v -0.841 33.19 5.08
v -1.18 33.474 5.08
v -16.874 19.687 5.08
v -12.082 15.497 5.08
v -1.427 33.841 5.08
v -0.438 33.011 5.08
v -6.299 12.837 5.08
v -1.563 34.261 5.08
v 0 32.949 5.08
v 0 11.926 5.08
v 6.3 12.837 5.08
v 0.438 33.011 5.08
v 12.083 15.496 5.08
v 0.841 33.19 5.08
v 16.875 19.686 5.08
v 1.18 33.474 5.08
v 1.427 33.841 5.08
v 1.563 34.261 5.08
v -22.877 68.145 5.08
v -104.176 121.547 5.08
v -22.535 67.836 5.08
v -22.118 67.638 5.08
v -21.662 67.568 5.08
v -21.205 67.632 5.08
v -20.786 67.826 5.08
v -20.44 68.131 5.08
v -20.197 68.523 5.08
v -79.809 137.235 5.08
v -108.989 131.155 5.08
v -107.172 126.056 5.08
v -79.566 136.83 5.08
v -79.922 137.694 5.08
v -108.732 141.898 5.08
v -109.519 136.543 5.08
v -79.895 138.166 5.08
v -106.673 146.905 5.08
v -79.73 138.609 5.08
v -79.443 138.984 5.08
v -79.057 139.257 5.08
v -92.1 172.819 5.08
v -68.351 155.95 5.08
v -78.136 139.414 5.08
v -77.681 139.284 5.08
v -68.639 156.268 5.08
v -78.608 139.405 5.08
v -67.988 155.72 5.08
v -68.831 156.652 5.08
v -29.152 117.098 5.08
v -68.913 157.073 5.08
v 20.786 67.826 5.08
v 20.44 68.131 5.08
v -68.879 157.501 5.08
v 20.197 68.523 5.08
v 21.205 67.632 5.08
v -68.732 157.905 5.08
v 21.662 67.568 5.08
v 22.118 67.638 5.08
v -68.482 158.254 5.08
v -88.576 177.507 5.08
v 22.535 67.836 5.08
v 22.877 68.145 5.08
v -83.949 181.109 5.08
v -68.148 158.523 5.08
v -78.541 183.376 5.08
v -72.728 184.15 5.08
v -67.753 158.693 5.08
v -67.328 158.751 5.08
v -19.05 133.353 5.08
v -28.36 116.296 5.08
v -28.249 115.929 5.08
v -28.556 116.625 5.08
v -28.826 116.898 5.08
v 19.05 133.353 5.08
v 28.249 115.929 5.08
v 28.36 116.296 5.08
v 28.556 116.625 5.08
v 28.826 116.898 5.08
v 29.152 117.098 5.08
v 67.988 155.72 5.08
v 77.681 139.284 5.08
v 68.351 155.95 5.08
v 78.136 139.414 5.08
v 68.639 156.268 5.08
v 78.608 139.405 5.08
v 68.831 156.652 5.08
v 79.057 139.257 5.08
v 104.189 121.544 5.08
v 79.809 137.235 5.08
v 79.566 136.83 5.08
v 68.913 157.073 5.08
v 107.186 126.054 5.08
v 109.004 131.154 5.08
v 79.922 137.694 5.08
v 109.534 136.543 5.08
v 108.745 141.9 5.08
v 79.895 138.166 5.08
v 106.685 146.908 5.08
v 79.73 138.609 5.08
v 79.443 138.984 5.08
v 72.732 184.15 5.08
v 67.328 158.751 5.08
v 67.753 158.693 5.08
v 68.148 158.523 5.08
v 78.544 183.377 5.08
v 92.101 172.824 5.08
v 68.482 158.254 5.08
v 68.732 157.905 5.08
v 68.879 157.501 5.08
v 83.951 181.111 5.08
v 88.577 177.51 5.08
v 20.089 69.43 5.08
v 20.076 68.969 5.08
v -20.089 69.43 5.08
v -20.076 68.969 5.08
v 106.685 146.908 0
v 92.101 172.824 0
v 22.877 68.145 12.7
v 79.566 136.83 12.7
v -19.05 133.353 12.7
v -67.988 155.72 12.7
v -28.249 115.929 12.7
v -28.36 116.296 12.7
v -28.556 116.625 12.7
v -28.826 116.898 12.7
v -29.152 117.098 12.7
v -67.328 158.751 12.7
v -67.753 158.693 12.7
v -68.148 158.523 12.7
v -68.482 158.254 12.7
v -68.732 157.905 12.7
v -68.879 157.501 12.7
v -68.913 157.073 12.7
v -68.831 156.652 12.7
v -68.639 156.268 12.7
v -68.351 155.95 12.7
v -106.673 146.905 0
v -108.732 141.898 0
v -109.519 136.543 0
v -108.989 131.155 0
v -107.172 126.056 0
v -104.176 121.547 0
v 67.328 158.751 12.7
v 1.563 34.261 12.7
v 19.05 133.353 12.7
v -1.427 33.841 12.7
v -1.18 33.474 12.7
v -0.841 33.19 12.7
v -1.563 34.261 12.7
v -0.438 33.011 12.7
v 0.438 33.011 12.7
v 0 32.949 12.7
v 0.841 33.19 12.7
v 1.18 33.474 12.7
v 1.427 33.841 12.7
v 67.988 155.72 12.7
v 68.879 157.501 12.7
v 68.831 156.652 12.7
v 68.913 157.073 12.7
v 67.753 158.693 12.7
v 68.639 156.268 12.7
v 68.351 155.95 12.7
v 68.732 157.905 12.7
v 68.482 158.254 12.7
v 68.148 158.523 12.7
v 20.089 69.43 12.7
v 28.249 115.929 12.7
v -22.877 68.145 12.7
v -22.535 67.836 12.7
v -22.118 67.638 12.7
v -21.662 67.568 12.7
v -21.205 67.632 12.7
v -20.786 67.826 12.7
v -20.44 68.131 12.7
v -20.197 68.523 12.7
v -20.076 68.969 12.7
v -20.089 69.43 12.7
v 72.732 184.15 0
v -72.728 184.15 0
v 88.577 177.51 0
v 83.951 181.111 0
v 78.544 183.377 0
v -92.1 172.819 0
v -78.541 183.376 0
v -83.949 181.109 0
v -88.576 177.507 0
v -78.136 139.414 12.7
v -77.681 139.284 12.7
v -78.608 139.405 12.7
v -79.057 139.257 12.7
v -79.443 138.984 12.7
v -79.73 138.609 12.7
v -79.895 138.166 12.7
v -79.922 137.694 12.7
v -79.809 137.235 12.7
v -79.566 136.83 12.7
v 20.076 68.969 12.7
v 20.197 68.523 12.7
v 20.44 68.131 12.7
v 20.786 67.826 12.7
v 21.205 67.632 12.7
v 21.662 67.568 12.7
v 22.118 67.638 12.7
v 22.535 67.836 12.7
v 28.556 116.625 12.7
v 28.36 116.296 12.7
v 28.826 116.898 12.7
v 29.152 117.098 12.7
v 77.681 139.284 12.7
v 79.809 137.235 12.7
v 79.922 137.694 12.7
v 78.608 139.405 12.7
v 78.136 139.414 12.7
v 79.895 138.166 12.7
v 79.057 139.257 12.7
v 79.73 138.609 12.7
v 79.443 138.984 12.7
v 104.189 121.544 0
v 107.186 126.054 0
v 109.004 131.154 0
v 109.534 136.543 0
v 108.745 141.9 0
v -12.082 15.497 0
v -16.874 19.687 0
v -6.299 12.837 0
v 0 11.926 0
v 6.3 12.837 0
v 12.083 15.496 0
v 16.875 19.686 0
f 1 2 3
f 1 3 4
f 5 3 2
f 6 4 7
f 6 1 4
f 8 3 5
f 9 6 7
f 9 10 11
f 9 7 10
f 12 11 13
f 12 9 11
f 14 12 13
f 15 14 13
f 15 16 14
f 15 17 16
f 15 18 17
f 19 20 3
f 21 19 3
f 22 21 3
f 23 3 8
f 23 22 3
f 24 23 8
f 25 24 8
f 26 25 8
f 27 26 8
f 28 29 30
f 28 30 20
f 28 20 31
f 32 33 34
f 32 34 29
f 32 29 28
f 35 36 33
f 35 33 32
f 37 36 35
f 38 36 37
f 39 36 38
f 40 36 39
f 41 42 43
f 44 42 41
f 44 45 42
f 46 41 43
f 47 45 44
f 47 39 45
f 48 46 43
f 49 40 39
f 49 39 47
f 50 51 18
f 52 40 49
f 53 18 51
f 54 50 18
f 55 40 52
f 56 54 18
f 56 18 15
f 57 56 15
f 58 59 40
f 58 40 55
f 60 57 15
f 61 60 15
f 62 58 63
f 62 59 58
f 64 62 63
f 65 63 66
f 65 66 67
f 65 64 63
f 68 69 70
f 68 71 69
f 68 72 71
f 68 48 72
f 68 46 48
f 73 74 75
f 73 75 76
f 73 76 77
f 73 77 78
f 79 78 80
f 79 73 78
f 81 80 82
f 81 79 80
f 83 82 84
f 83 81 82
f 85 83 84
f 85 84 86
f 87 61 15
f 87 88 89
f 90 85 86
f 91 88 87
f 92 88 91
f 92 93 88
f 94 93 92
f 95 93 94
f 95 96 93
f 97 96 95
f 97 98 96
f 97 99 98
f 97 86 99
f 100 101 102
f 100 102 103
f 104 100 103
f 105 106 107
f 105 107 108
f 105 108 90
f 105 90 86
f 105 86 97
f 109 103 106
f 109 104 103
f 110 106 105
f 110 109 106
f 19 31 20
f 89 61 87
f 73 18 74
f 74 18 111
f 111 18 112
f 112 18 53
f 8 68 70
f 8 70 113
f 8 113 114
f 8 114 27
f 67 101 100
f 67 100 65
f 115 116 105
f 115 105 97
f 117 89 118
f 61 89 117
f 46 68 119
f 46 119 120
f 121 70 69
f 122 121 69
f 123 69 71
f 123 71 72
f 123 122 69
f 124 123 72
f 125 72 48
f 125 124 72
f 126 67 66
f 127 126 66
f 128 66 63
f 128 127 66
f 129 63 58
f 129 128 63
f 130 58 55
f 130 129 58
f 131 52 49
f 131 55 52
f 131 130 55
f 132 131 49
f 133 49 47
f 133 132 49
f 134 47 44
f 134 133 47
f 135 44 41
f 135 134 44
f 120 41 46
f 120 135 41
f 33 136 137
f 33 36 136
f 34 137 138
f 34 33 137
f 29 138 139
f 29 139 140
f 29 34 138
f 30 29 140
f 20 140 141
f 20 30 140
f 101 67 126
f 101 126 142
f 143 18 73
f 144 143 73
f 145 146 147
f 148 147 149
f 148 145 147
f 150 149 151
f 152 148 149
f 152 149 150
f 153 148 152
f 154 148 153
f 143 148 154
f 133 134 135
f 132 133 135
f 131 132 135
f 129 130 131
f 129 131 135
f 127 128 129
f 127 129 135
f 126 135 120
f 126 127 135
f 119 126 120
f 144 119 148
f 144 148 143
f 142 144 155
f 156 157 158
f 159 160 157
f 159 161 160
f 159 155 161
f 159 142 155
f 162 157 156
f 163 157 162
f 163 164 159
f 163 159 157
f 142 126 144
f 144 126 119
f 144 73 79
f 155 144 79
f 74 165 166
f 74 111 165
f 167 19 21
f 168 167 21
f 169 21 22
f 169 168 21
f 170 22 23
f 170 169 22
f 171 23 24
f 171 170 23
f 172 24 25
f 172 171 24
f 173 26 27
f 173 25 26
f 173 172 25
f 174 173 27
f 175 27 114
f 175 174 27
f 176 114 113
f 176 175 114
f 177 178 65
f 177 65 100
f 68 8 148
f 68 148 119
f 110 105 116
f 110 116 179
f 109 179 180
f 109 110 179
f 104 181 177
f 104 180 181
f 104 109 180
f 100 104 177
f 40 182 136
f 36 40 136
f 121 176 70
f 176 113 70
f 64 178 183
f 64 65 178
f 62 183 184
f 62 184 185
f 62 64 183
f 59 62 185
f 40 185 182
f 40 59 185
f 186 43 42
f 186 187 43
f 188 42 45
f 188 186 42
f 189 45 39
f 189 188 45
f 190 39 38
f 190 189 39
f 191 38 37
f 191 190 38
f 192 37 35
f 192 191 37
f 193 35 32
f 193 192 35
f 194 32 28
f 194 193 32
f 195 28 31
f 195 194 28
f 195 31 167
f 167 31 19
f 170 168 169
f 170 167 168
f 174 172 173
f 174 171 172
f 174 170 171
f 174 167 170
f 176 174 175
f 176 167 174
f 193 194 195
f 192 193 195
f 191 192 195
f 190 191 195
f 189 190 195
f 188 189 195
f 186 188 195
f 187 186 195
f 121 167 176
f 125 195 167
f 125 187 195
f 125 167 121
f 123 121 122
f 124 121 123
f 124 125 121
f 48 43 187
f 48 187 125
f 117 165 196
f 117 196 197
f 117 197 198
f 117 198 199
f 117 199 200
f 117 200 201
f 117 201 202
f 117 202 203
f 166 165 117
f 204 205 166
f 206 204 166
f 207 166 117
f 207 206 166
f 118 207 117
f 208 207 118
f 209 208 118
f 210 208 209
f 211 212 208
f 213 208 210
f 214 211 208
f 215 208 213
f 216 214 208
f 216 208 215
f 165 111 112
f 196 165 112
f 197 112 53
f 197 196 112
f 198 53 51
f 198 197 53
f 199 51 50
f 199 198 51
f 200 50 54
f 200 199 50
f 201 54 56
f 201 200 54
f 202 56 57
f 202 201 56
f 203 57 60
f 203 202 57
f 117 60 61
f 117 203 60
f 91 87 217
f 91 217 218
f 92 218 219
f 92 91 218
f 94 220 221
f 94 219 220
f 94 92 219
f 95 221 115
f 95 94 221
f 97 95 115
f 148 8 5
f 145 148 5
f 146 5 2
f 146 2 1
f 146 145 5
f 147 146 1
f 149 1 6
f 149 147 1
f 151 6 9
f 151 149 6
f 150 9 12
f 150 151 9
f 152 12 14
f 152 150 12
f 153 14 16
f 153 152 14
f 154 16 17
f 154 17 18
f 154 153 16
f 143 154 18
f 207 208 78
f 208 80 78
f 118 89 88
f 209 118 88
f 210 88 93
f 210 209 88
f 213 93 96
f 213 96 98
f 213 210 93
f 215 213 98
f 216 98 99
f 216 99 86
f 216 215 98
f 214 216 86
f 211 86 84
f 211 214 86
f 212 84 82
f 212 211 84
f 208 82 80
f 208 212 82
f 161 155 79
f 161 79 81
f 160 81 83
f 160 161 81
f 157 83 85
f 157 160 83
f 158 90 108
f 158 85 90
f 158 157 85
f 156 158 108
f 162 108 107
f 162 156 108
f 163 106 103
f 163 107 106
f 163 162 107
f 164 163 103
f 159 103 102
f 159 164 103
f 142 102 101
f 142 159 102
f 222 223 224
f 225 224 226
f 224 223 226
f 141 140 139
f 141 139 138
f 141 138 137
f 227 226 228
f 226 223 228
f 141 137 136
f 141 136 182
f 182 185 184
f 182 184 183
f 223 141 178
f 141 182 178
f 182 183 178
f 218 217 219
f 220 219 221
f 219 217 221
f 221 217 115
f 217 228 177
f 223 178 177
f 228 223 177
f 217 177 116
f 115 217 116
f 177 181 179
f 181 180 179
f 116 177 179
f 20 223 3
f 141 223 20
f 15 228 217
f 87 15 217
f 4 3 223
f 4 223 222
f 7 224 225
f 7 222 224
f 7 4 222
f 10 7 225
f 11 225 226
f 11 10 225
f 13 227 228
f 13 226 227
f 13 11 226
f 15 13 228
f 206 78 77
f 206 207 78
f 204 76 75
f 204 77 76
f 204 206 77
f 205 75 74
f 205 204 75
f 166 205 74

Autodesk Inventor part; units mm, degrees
ref_plane "YZ Plane" through (0, 0, 0) normal (1, 0, 0) x (0, 1, 0)
ref_plane "XZ Plane" through (0, 0, 0) normal (0, 1, 0) x (-1, 0, 0)
ref_plane "XY Plane" through (0, 0, 0) normal (0, 0, 1) x (1, 0, 0)
sketch "Sketch1" plane through (0, 0, 0) normal (0, 0, 1) x (1, 0, 0)
  line L0 (0, 184.15) -> (0, 133.3527) construction
  line L1 (0, 133.3527) -> (114.3119, 133.3527) construction
  line L2 (0, 133.3527) -> (-114.2939, 133.3527) construction
  line L3 (0, 184.15) -> (85.7282, 184.15)
  line L4 (0, 184.15) -> (-85.7274, 184.15)
  line L5 (-85.7274, 184.15) -> (-114.2939, 133.3527)
  line L6 (0, 0) -> (-114.2939, 133.3527)
  line L7 (0, 0) -> (114.3119, 133.3527)
  line L8 (85.7282, 184.15) -> (114.3119, 133.3527)
  line L9 (0, 158.7514) -> (0, 25.4014) construction
  line L10 (0, 158.7514) -> (74.6202, 158.7514)
  line L11 (0, 158.7514) -> (-74.6202, 158.7514)
  line L12 (0, 133.3527) -> (19.05, 133.3527) construction
  line L13 (0, 133.3527) -> (-19.05, 133.3527) construction
  line L14 (74.6202, 158.7514) -> (19.05, 133.3527)
  line L15 (19.05, 133.3527) -> (0, 25.4014)
  line L16 (0, 25.4014) -> (-19.05, 133.3527)
  line L17 (-74.6202, 158.7514) -> (-19.05, 133.3527)
  dimension "d0" = 184.15
  dimension "d1" = 19.05
  dimension "d2" = 19.05
sketch "Sketch2" plane through (0, 0, 0) normal (0, 0, 1) x (1, 0, 0)
  line L0 (74.6202, 158.7513) -> (83.9607, 142.1546) construction
  line L1 (19.05, 133.3527) -> (28.3932, 116.7512) construction
  line L2 (0, 0) -> (0, 63.5079) construction
  line L3 (0, 63.5079) -> (19.05, 63.5079) construction
  line L4 (19.05, 63.5079) -> (28.3932, 116.7512)
  line L5 (83.9607, 142.1546) -> (28.3932, 116.7512)
  line L6 (83.9607, 142.1546) -> (19.05, 63.5079)
  line L7 (-19.05, 63.5079) -> (-28.3932, 116.7512)
  line L8 (-83.9607, 142.1546) -> (-28.3932, 116.7512)
  line L9 (-83.9607, 142.1546) -> (-19.05, 63.5079)
  line L10 (74.6202, 158.7513) -> (0, 158.7513)
  line L11 (19.05, 133.3527) -> (74.6202, 158.7513)
  line L12 (0, 25.4018) -> (19.05, 133.3527)
  line L13 (0, 158.7513) -> (0, 25.4018) construction
  line L14 (-74.6202, 158.7513) -> (0, 158.7513)
  line L15 (-19.05, 133.3527) -> (-74.6202, 158.7513)
  line L16 (0, 25.4018) -> (-19.05, 133.3527)
  dimension "d3" = 19.05
extrude "Extrusion1" add sketch "Sketch1" along normal blind 5.08 contours L3 L8 L7 L6 L5 L4 | L10 L14 L15 L16 L17 L11
extrude "Extrusion2" add sketch "Sketch2" along normal blind 12.7
fillet "Fillet1" radius 22.225 5 edges at (114.3119, 133.3527, 2.54) (85.7282, 184.15, 2.54) (-85.7274, 184.15, 2.54) (-114.2939, 133.3527, 2.54) (0, 0, 2.54)
fillet "Fillet2" radius 1.5875 1 edges at (74.6202, 158.7513, 8.89)
fillet "Fillet3" radius 1.5875 1 edges at (0, 25.4018, 8.89)
fillet "Fillet4" radius 1.5875 1 edges at (-74.6202, 158.7513, 8.89)
fillet "Fillet5" radius 1.5875 4 edges at (-83.9607, 142.1546, 8.89) (83.9607, 142.1546, 8.89) (-19.05, 63.5079, 8.89) (19.05, 63.5079, 8.89)
fillet "Fillet6" radius 1.5875 2 edges at (28.3932, 116.7512, 8.89) (-28.3932, 116.7512, 8.89)
sketch "Sketch3" plane through (0, 0, 5.08) normal (0, 0, 1) x (1, 0, 0)
  point P0 (0, 0)
properties part number "item"
